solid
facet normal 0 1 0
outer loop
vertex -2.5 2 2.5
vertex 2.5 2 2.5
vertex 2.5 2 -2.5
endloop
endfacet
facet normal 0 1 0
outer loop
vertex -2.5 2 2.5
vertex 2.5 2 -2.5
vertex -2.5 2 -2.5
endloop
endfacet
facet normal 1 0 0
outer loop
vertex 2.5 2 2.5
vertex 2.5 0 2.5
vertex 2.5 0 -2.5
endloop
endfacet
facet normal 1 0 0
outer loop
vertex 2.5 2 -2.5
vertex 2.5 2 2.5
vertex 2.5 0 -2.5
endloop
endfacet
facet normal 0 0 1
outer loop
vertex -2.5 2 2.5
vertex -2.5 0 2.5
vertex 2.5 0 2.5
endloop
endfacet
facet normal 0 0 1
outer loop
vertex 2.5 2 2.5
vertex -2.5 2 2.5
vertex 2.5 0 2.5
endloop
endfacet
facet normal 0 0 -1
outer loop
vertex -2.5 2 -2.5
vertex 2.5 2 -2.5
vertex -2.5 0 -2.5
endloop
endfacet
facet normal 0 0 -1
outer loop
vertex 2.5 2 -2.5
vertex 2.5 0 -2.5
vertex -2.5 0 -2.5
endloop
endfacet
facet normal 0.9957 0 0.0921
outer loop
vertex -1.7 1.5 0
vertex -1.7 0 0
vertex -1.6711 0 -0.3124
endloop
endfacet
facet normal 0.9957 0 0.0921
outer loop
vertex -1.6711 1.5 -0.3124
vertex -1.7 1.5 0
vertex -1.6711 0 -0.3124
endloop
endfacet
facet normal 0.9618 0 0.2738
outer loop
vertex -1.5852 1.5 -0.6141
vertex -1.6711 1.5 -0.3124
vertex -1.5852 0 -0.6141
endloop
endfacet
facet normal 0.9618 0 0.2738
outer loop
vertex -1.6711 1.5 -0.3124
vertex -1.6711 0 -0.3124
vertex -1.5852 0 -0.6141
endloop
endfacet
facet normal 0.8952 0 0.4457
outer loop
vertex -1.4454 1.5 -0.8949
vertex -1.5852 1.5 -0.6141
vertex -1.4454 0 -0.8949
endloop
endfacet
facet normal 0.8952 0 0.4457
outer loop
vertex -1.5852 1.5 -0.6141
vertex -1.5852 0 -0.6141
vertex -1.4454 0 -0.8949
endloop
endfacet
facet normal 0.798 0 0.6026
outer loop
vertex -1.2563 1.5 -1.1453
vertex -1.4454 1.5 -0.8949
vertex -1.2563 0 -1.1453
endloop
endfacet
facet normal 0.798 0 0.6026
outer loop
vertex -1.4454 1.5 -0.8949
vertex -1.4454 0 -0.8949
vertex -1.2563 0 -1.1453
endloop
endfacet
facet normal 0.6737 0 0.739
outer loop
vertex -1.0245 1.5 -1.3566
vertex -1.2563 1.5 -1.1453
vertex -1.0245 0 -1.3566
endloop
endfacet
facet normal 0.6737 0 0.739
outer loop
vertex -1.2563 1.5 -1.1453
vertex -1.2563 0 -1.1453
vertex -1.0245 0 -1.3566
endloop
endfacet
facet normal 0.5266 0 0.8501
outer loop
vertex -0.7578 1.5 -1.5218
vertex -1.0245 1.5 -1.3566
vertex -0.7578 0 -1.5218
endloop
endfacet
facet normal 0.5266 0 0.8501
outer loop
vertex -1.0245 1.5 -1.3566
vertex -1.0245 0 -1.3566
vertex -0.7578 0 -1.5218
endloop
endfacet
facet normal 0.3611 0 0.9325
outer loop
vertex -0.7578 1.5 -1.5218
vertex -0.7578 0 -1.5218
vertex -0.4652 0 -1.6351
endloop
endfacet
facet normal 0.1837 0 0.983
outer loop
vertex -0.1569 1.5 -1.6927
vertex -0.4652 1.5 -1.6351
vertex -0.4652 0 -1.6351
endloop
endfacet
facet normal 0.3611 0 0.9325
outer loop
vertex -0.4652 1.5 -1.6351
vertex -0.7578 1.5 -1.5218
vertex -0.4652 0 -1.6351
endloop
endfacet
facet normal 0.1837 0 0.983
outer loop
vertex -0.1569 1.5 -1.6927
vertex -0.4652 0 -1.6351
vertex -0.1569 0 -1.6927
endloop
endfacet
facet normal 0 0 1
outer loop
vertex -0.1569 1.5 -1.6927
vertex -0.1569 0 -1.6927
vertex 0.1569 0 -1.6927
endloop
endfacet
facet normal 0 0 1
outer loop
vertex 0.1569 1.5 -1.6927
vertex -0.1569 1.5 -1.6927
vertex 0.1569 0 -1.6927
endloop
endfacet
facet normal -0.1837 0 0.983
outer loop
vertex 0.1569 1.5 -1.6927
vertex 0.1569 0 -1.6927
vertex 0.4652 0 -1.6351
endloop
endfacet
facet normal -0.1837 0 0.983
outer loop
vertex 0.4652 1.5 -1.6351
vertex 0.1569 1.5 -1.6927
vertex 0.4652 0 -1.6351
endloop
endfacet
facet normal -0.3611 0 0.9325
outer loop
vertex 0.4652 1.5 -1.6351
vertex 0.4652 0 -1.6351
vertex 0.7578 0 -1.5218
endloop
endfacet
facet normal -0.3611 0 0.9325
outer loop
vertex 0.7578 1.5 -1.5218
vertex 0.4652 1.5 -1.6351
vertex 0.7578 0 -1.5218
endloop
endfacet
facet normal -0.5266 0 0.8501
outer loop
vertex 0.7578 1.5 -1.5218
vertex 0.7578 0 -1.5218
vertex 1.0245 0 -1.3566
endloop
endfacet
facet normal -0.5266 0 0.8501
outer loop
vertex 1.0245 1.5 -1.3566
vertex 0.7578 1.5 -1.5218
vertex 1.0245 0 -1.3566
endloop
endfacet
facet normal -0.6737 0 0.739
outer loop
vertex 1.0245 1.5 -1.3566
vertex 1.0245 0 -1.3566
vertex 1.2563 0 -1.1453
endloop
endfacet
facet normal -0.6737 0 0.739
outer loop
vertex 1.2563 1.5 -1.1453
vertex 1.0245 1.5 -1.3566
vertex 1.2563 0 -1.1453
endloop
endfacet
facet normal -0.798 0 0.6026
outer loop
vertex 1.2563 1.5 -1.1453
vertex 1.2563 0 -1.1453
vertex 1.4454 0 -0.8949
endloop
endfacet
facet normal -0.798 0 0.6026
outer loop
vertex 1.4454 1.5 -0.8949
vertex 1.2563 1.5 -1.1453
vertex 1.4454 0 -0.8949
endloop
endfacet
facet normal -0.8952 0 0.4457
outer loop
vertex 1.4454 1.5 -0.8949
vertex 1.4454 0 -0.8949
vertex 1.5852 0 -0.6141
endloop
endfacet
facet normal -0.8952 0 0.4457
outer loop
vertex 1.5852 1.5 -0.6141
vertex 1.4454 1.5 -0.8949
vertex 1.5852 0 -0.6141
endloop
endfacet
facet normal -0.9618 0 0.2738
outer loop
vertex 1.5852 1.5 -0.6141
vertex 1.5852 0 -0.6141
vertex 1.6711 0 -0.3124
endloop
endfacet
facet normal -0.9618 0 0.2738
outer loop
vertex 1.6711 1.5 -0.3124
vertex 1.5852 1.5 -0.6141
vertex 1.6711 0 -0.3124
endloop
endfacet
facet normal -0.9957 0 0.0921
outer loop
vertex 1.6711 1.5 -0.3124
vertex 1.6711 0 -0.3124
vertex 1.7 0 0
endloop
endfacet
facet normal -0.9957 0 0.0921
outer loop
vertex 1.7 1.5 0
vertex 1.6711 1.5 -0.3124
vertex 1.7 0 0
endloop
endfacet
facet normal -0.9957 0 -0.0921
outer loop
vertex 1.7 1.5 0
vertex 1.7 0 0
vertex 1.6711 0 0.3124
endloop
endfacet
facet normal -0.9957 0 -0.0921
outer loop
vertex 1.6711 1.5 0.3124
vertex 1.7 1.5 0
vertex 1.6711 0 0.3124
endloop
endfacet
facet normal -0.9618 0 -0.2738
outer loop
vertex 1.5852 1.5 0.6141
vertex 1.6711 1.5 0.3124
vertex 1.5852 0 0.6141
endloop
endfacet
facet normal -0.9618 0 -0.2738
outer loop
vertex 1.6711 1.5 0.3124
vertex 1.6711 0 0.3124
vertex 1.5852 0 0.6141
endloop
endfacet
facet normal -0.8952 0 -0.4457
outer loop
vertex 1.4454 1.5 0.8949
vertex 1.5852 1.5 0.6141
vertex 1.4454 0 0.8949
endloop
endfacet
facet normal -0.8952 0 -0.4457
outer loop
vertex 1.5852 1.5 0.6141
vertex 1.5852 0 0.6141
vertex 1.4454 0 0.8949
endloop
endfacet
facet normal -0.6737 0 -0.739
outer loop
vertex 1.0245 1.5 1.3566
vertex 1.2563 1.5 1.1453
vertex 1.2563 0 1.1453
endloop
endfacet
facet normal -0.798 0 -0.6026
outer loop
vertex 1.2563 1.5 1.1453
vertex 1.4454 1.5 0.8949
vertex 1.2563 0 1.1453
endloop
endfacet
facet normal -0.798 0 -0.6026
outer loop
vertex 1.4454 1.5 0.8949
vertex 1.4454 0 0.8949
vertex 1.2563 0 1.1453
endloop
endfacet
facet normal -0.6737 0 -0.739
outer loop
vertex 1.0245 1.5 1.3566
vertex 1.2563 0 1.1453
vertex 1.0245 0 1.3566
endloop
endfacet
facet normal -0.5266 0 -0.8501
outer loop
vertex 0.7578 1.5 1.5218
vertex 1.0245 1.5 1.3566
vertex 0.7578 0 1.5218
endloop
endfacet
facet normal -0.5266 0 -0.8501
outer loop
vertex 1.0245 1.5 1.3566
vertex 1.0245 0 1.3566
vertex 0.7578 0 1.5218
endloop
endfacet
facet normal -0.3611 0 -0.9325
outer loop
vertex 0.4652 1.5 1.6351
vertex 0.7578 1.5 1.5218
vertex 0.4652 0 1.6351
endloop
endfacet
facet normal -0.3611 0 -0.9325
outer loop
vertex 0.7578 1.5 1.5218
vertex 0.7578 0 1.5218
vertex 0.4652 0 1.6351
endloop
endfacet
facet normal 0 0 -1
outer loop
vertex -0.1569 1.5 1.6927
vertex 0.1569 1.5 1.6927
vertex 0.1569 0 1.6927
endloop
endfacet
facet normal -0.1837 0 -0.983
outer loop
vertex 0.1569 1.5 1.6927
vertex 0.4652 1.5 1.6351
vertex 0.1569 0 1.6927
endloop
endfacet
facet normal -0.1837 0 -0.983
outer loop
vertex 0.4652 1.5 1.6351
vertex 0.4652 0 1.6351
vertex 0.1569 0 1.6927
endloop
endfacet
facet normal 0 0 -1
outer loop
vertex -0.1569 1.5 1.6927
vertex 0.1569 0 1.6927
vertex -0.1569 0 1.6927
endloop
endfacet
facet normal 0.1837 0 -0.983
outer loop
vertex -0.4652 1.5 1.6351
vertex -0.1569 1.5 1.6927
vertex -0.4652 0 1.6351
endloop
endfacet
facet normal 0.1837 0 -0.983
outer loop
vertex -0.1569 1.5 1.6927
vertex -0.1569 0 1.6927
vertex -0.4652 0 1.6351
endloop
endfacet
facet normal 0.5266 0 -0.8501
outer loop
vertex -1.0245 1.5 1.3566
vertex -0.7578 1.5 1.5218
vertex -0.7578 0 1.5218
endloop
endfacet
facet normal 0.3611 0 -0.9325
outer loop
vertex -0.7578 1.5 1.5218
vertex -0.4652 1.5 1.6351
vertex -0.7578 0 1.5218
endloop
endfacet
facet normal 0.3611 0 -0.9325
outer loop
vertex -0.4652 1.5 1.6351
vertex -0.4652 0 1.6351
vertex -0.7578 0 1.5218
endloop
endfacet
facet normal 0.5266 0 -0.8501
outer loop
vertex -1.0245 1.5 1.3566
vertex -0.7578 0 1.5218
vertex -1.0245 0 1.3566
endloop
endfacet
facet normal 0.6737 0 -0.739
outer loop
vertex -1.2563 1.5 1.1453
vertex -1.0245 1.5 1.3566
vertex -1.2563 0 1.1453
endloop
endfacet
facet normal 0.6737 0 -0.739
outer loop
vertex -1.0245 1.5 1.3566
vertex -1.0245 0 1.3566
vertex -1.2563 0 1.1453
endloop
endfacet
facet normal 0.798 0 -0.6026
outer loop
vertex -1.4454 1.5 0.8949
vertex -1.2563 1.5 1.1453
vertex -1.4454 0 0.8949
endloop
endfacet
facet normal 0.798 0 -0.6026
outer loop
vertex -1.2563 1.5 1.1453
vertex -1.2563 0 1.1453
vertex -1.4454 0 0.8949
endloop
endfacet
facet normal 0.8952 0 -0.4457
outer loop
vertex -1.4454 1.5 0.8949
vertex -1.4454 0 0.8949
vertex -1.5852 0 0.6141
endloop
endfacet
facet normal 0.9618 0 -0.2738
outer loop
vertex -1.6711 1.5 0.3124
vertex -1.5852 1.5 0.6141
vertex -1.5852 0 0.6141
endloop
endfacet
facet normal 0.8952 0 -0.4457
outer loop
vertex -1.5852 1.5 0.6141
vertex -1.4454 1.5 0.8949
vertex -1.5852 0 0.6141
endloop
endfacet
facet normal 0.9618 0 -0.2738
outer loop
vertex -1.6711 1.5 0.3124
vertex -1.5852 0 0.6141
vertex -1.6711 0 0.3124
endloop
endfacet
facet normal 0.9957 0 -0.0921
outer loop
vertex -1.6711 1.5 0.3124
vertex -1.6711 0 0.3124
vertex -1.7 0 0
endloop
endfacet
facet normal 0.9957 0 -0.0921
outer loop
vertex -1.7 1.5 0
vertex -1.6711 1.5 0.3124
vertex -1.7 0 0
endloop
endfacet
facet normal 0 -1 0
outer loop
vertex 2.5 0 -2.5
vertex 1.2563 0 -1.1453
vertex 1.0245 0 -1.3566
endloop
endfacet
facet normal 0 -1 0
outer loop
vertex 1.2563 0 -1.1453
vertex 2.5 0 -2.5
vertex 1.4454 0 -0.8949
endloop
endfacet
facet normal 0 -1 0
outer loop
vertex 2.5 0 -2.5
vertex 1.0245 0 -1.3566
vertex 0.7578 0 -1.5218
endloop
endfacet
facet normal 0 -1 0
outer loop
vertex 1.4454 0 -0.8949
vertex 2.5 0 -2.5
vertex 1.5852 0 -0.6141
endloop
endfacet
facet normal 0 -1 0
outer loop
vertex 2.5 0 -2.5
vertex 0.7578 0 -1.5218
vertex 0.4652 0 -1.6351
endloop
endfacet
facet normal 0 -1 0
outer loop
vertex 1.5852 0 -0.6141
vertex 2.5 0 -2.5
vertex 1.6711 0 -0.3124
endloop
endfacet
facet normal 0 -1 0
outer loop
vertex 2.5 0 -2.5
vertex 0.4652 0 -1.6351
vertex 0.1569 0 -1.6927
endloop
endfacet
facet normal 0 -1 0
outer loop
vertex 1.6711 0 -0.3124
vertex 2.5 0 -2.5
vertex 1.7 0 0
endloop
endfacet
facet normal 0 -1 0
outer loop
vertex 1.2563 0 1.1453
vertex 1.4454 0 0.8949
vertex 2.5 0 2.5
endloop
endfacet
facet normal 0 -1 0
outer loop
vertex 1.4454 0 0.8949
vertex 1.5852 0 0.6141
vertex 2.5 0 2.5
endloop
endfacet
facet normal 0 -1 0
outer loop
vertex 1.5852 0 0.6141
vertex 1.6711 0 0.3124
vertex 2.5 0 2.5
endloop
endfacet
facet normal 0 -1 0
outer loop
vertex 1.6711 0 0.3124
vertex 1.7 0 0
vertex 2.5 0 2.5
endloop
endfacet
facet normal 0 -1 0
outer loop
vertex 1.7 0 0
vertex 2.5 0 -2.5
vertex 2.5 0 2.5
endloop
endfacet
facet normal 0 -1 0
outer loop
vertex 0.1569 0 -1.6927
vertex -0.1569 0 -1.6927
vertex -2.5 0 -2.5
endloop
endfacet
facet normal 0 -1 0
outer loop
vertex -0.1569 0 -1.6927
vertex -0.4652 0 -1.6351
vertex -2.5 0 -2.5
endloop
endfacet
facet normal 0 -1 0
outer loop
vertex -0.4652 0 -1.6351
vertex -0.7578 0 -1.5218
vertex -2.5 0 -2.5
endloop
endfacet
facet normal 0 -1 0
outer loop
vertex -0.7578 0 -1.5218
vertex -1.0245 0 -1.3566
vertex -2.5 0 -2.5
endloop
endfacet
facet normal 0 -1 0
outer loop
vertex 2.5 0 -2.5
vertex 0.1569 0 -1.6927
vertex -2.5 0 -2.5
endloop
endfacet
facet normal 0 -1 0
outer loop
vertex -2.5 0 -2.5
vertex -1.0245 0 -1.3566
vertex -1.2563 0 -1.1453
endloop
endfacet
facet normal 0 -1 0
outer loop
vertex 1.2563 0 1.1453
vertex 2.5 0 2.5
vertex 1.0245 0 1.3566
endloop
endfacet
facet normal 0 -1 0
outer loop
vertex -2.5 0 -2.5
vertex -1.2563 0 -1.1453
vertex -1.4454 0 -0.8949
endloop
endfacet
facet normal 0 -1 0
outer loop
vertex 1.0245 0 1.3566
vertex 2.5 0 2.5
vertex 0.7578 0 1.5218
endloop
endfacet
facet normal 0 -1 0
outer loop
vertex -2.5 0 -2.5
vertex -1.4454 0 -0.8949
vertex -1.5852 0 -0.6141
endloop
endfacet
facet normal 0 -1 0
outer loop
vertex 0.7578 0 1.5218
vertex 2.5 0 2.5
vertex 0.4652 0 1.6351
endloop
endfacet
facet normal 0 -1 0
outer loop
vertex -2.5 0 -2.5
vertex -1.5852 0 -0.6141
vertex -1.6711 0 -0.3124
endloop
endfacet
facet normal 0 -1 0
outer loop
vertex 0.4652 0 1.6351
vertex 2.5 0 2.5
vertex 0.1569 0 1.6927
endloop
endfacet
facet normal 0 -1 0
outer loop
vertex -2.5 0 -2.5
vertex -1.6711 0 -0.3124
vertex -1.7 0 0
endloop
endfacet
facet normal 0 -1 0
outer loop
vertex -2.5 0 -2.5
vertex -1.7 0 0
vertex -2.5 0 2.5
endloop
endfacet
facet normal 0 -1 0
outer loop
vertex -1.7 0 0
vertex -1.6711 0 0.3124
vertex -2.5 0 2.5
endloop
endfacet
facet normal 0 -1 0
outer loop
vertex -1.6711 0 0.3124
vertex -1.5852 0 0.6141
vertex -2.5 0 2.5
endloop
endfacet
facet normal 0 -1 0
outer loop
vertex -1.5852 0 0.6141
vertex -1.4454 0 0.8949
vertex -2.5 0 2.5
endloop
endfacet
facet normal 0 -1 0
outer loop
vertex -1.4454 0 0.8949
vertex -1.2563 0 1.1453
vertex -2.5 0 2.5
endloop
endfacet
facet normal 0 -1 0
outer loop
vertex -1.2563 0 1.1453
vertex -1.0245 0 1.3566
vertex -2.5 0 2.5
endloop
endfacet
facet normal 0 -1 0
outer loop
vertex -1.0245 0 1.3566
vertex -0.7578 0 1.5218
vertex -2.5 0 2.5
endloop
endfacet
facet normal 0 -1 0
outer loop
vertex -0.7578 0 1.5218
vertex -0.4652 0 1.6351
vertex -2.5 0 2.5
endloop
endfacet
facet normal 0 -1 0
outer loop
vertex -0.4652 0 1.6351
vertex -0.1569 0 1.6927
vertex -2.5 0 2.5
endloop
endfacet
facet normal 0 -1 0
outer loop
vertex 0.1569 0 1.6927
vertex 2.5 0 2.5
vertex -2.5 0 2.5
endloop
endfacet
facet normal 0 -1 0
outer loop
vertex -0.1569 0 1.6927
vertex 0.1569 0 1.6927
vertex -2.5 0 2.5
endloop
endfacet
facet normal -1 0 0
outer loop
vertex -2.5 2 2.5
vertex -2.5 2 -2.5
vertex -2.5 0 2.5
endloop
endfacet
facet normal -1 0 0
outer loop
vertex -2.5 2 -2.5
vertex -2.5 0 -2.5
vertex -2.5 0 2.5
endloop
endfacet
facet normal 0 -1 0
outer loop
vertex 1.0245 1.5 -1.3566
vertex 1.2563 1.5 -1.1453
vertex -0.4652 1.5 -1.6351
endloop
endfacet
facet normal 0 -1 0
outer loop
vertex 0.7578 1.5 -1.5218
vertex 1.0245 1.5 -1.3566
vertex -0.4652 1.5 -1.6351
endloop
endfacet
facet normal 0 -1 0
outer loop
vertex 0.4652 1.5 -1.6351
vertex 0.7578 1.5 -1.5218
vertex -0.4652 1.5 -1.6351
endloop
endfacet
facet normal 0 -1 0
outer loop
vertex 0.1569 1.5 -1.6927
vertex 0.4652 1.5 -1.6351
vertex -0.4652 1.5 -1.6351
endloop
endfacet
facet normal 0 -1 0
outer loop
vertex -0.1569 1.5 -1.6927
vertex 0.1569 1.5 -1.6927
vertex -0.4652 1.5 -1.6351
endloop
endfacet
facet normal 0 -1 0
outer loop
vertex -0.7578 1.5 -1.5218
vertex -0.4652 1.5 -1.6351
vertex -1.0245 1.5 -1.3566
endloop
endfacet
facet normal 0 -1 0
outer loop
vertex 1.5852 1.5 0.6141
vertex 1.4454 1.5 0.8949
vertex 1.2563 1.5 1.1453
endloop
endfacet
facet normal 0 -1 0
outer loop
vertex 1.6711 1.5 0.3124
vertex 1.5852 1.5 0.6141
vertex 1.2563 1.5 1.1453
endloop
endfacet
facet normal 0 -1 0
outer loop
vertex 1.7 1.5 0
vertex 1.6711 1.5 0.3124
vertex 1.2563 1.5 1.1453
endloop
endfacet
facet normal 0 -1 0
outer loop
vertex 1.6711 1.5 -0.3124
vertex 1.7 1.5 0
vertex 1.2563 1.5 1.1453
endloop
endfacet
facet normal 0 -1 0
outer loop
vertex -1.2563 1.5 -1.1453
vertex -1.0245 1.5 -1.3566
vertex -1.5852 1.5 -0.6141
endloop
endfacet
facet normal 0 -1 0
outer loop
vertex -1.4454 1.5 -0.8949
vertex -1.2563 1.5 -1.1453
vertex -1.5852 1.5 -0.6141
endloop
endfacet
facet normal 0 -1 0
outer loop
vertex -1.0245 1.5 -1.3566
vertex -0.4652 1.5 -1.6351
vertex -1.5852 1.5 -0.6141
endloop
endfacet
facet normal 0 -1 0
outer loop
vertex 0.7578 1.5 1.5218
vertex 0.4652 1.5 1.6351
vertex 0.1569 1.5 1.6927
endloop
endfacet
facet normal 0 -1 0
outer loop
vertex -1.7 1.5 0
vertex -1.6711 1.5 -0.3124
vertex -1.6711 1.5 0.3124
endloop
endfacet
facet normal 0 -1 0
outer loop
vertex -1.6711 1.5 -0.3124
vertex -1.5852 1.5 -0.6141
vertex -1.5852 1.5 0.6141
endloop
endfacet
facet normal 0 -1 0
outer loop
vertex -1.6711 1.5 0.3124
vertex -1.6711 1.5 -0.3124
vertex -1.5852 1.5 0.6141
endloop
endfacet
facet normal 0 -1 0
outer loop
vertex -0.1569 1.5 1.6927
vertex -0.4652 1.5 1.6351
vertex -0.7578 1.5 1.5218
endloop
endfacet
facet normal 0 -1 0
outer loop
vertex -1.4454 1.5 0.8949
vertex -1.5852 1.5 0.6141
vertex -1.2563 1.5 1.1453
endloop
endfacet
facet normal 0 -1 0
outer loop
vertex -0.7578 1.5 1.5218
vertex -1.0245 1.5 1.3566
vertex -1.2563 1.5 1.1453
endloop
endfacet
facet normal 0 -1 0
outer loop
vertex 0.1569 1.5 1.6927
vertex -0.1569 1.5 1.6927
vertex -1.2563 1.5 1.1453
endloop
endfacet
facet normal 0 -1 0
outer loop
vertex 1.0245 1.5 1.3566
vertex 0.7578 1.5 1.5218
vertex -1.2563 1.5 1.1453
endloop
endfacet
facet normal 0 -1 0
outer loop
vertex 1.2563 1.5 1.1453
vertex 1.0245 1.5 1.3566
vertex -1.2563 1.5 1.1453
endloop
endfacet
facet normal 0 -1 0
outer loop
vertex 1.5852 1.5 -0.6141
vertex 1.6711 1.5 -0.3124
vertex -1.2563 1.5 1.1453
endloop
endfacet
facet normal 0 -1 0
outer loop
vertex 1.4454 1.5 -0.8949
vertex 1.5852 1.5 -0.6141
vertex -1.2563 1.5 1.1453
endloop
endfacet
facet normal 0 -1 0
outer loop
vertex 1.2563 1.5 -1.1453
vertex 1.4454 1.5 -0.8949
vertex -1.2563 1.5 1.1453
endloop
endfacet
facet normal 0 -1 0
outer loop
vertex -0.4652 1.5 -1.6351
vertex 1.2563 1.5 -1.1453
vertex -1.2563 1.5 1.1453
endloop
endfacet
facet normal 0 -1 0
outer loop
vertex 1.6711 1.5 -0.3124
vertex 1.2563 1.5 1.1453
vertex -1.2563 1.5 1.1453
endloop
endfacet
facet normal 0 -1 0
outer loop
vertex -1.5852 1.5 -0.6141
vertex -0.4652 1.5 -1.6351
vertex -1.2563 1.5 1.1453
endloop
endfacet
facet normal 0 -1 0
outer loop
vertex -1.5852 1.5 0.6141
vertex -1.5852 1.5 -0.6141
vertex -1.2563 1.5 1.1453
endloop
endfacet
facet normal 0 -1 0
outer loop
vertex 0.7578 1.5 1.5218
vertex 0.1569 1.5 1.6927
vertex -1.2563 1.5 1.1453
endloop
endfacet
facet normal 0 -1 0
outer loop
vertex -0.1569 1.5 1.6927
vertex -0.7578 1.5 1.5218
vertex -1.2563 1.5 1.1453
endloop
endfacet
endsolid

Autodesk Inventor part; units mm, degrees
ref_plane "YZ Plane" through (0, 0, 0) normal (1, 0, 0) x (0, 1, 0)
ref_plane "XZ Plane" through (0, 0, 0) normal (0, 1, 0) x (-1, 0, 0)
ref_plane "XY Plane" through (0, 0, 0) normal (0, 0, 1) x (1, 0, 0)
sketch "草圖1" plane through (0, 0, 0) normal (0, 1, 0) x (-1, 0, 0)
  line L0 (2.5, 2.5) -> (-2.5, 2.5)
  line L1 (-2.5, 2.5) -> (-2.5, -2.5)
  line L2 (-2.5, -2.5) -> (2.5, -2.5)
  line L3 (2.5, -2.5) -> (2.5, 2.5)
  circle A0 centre (0, 0) radius 1.7
  point P0 (2.5, 0)
  point P1 (0, -2.5)
  dimension "d0" = 5
  dimension "d1" = 5
  dimension "d2" = 3.4
extrude "擠出1" add sketch "草圖1" along normal blind 2 contours L3 L2 L1 L0 | A0
extrude "擠出2" cut sketch "草圖1" along normal blind 1.5 contours A0
properties part number "110033226_ipt_37_小河方塊"
